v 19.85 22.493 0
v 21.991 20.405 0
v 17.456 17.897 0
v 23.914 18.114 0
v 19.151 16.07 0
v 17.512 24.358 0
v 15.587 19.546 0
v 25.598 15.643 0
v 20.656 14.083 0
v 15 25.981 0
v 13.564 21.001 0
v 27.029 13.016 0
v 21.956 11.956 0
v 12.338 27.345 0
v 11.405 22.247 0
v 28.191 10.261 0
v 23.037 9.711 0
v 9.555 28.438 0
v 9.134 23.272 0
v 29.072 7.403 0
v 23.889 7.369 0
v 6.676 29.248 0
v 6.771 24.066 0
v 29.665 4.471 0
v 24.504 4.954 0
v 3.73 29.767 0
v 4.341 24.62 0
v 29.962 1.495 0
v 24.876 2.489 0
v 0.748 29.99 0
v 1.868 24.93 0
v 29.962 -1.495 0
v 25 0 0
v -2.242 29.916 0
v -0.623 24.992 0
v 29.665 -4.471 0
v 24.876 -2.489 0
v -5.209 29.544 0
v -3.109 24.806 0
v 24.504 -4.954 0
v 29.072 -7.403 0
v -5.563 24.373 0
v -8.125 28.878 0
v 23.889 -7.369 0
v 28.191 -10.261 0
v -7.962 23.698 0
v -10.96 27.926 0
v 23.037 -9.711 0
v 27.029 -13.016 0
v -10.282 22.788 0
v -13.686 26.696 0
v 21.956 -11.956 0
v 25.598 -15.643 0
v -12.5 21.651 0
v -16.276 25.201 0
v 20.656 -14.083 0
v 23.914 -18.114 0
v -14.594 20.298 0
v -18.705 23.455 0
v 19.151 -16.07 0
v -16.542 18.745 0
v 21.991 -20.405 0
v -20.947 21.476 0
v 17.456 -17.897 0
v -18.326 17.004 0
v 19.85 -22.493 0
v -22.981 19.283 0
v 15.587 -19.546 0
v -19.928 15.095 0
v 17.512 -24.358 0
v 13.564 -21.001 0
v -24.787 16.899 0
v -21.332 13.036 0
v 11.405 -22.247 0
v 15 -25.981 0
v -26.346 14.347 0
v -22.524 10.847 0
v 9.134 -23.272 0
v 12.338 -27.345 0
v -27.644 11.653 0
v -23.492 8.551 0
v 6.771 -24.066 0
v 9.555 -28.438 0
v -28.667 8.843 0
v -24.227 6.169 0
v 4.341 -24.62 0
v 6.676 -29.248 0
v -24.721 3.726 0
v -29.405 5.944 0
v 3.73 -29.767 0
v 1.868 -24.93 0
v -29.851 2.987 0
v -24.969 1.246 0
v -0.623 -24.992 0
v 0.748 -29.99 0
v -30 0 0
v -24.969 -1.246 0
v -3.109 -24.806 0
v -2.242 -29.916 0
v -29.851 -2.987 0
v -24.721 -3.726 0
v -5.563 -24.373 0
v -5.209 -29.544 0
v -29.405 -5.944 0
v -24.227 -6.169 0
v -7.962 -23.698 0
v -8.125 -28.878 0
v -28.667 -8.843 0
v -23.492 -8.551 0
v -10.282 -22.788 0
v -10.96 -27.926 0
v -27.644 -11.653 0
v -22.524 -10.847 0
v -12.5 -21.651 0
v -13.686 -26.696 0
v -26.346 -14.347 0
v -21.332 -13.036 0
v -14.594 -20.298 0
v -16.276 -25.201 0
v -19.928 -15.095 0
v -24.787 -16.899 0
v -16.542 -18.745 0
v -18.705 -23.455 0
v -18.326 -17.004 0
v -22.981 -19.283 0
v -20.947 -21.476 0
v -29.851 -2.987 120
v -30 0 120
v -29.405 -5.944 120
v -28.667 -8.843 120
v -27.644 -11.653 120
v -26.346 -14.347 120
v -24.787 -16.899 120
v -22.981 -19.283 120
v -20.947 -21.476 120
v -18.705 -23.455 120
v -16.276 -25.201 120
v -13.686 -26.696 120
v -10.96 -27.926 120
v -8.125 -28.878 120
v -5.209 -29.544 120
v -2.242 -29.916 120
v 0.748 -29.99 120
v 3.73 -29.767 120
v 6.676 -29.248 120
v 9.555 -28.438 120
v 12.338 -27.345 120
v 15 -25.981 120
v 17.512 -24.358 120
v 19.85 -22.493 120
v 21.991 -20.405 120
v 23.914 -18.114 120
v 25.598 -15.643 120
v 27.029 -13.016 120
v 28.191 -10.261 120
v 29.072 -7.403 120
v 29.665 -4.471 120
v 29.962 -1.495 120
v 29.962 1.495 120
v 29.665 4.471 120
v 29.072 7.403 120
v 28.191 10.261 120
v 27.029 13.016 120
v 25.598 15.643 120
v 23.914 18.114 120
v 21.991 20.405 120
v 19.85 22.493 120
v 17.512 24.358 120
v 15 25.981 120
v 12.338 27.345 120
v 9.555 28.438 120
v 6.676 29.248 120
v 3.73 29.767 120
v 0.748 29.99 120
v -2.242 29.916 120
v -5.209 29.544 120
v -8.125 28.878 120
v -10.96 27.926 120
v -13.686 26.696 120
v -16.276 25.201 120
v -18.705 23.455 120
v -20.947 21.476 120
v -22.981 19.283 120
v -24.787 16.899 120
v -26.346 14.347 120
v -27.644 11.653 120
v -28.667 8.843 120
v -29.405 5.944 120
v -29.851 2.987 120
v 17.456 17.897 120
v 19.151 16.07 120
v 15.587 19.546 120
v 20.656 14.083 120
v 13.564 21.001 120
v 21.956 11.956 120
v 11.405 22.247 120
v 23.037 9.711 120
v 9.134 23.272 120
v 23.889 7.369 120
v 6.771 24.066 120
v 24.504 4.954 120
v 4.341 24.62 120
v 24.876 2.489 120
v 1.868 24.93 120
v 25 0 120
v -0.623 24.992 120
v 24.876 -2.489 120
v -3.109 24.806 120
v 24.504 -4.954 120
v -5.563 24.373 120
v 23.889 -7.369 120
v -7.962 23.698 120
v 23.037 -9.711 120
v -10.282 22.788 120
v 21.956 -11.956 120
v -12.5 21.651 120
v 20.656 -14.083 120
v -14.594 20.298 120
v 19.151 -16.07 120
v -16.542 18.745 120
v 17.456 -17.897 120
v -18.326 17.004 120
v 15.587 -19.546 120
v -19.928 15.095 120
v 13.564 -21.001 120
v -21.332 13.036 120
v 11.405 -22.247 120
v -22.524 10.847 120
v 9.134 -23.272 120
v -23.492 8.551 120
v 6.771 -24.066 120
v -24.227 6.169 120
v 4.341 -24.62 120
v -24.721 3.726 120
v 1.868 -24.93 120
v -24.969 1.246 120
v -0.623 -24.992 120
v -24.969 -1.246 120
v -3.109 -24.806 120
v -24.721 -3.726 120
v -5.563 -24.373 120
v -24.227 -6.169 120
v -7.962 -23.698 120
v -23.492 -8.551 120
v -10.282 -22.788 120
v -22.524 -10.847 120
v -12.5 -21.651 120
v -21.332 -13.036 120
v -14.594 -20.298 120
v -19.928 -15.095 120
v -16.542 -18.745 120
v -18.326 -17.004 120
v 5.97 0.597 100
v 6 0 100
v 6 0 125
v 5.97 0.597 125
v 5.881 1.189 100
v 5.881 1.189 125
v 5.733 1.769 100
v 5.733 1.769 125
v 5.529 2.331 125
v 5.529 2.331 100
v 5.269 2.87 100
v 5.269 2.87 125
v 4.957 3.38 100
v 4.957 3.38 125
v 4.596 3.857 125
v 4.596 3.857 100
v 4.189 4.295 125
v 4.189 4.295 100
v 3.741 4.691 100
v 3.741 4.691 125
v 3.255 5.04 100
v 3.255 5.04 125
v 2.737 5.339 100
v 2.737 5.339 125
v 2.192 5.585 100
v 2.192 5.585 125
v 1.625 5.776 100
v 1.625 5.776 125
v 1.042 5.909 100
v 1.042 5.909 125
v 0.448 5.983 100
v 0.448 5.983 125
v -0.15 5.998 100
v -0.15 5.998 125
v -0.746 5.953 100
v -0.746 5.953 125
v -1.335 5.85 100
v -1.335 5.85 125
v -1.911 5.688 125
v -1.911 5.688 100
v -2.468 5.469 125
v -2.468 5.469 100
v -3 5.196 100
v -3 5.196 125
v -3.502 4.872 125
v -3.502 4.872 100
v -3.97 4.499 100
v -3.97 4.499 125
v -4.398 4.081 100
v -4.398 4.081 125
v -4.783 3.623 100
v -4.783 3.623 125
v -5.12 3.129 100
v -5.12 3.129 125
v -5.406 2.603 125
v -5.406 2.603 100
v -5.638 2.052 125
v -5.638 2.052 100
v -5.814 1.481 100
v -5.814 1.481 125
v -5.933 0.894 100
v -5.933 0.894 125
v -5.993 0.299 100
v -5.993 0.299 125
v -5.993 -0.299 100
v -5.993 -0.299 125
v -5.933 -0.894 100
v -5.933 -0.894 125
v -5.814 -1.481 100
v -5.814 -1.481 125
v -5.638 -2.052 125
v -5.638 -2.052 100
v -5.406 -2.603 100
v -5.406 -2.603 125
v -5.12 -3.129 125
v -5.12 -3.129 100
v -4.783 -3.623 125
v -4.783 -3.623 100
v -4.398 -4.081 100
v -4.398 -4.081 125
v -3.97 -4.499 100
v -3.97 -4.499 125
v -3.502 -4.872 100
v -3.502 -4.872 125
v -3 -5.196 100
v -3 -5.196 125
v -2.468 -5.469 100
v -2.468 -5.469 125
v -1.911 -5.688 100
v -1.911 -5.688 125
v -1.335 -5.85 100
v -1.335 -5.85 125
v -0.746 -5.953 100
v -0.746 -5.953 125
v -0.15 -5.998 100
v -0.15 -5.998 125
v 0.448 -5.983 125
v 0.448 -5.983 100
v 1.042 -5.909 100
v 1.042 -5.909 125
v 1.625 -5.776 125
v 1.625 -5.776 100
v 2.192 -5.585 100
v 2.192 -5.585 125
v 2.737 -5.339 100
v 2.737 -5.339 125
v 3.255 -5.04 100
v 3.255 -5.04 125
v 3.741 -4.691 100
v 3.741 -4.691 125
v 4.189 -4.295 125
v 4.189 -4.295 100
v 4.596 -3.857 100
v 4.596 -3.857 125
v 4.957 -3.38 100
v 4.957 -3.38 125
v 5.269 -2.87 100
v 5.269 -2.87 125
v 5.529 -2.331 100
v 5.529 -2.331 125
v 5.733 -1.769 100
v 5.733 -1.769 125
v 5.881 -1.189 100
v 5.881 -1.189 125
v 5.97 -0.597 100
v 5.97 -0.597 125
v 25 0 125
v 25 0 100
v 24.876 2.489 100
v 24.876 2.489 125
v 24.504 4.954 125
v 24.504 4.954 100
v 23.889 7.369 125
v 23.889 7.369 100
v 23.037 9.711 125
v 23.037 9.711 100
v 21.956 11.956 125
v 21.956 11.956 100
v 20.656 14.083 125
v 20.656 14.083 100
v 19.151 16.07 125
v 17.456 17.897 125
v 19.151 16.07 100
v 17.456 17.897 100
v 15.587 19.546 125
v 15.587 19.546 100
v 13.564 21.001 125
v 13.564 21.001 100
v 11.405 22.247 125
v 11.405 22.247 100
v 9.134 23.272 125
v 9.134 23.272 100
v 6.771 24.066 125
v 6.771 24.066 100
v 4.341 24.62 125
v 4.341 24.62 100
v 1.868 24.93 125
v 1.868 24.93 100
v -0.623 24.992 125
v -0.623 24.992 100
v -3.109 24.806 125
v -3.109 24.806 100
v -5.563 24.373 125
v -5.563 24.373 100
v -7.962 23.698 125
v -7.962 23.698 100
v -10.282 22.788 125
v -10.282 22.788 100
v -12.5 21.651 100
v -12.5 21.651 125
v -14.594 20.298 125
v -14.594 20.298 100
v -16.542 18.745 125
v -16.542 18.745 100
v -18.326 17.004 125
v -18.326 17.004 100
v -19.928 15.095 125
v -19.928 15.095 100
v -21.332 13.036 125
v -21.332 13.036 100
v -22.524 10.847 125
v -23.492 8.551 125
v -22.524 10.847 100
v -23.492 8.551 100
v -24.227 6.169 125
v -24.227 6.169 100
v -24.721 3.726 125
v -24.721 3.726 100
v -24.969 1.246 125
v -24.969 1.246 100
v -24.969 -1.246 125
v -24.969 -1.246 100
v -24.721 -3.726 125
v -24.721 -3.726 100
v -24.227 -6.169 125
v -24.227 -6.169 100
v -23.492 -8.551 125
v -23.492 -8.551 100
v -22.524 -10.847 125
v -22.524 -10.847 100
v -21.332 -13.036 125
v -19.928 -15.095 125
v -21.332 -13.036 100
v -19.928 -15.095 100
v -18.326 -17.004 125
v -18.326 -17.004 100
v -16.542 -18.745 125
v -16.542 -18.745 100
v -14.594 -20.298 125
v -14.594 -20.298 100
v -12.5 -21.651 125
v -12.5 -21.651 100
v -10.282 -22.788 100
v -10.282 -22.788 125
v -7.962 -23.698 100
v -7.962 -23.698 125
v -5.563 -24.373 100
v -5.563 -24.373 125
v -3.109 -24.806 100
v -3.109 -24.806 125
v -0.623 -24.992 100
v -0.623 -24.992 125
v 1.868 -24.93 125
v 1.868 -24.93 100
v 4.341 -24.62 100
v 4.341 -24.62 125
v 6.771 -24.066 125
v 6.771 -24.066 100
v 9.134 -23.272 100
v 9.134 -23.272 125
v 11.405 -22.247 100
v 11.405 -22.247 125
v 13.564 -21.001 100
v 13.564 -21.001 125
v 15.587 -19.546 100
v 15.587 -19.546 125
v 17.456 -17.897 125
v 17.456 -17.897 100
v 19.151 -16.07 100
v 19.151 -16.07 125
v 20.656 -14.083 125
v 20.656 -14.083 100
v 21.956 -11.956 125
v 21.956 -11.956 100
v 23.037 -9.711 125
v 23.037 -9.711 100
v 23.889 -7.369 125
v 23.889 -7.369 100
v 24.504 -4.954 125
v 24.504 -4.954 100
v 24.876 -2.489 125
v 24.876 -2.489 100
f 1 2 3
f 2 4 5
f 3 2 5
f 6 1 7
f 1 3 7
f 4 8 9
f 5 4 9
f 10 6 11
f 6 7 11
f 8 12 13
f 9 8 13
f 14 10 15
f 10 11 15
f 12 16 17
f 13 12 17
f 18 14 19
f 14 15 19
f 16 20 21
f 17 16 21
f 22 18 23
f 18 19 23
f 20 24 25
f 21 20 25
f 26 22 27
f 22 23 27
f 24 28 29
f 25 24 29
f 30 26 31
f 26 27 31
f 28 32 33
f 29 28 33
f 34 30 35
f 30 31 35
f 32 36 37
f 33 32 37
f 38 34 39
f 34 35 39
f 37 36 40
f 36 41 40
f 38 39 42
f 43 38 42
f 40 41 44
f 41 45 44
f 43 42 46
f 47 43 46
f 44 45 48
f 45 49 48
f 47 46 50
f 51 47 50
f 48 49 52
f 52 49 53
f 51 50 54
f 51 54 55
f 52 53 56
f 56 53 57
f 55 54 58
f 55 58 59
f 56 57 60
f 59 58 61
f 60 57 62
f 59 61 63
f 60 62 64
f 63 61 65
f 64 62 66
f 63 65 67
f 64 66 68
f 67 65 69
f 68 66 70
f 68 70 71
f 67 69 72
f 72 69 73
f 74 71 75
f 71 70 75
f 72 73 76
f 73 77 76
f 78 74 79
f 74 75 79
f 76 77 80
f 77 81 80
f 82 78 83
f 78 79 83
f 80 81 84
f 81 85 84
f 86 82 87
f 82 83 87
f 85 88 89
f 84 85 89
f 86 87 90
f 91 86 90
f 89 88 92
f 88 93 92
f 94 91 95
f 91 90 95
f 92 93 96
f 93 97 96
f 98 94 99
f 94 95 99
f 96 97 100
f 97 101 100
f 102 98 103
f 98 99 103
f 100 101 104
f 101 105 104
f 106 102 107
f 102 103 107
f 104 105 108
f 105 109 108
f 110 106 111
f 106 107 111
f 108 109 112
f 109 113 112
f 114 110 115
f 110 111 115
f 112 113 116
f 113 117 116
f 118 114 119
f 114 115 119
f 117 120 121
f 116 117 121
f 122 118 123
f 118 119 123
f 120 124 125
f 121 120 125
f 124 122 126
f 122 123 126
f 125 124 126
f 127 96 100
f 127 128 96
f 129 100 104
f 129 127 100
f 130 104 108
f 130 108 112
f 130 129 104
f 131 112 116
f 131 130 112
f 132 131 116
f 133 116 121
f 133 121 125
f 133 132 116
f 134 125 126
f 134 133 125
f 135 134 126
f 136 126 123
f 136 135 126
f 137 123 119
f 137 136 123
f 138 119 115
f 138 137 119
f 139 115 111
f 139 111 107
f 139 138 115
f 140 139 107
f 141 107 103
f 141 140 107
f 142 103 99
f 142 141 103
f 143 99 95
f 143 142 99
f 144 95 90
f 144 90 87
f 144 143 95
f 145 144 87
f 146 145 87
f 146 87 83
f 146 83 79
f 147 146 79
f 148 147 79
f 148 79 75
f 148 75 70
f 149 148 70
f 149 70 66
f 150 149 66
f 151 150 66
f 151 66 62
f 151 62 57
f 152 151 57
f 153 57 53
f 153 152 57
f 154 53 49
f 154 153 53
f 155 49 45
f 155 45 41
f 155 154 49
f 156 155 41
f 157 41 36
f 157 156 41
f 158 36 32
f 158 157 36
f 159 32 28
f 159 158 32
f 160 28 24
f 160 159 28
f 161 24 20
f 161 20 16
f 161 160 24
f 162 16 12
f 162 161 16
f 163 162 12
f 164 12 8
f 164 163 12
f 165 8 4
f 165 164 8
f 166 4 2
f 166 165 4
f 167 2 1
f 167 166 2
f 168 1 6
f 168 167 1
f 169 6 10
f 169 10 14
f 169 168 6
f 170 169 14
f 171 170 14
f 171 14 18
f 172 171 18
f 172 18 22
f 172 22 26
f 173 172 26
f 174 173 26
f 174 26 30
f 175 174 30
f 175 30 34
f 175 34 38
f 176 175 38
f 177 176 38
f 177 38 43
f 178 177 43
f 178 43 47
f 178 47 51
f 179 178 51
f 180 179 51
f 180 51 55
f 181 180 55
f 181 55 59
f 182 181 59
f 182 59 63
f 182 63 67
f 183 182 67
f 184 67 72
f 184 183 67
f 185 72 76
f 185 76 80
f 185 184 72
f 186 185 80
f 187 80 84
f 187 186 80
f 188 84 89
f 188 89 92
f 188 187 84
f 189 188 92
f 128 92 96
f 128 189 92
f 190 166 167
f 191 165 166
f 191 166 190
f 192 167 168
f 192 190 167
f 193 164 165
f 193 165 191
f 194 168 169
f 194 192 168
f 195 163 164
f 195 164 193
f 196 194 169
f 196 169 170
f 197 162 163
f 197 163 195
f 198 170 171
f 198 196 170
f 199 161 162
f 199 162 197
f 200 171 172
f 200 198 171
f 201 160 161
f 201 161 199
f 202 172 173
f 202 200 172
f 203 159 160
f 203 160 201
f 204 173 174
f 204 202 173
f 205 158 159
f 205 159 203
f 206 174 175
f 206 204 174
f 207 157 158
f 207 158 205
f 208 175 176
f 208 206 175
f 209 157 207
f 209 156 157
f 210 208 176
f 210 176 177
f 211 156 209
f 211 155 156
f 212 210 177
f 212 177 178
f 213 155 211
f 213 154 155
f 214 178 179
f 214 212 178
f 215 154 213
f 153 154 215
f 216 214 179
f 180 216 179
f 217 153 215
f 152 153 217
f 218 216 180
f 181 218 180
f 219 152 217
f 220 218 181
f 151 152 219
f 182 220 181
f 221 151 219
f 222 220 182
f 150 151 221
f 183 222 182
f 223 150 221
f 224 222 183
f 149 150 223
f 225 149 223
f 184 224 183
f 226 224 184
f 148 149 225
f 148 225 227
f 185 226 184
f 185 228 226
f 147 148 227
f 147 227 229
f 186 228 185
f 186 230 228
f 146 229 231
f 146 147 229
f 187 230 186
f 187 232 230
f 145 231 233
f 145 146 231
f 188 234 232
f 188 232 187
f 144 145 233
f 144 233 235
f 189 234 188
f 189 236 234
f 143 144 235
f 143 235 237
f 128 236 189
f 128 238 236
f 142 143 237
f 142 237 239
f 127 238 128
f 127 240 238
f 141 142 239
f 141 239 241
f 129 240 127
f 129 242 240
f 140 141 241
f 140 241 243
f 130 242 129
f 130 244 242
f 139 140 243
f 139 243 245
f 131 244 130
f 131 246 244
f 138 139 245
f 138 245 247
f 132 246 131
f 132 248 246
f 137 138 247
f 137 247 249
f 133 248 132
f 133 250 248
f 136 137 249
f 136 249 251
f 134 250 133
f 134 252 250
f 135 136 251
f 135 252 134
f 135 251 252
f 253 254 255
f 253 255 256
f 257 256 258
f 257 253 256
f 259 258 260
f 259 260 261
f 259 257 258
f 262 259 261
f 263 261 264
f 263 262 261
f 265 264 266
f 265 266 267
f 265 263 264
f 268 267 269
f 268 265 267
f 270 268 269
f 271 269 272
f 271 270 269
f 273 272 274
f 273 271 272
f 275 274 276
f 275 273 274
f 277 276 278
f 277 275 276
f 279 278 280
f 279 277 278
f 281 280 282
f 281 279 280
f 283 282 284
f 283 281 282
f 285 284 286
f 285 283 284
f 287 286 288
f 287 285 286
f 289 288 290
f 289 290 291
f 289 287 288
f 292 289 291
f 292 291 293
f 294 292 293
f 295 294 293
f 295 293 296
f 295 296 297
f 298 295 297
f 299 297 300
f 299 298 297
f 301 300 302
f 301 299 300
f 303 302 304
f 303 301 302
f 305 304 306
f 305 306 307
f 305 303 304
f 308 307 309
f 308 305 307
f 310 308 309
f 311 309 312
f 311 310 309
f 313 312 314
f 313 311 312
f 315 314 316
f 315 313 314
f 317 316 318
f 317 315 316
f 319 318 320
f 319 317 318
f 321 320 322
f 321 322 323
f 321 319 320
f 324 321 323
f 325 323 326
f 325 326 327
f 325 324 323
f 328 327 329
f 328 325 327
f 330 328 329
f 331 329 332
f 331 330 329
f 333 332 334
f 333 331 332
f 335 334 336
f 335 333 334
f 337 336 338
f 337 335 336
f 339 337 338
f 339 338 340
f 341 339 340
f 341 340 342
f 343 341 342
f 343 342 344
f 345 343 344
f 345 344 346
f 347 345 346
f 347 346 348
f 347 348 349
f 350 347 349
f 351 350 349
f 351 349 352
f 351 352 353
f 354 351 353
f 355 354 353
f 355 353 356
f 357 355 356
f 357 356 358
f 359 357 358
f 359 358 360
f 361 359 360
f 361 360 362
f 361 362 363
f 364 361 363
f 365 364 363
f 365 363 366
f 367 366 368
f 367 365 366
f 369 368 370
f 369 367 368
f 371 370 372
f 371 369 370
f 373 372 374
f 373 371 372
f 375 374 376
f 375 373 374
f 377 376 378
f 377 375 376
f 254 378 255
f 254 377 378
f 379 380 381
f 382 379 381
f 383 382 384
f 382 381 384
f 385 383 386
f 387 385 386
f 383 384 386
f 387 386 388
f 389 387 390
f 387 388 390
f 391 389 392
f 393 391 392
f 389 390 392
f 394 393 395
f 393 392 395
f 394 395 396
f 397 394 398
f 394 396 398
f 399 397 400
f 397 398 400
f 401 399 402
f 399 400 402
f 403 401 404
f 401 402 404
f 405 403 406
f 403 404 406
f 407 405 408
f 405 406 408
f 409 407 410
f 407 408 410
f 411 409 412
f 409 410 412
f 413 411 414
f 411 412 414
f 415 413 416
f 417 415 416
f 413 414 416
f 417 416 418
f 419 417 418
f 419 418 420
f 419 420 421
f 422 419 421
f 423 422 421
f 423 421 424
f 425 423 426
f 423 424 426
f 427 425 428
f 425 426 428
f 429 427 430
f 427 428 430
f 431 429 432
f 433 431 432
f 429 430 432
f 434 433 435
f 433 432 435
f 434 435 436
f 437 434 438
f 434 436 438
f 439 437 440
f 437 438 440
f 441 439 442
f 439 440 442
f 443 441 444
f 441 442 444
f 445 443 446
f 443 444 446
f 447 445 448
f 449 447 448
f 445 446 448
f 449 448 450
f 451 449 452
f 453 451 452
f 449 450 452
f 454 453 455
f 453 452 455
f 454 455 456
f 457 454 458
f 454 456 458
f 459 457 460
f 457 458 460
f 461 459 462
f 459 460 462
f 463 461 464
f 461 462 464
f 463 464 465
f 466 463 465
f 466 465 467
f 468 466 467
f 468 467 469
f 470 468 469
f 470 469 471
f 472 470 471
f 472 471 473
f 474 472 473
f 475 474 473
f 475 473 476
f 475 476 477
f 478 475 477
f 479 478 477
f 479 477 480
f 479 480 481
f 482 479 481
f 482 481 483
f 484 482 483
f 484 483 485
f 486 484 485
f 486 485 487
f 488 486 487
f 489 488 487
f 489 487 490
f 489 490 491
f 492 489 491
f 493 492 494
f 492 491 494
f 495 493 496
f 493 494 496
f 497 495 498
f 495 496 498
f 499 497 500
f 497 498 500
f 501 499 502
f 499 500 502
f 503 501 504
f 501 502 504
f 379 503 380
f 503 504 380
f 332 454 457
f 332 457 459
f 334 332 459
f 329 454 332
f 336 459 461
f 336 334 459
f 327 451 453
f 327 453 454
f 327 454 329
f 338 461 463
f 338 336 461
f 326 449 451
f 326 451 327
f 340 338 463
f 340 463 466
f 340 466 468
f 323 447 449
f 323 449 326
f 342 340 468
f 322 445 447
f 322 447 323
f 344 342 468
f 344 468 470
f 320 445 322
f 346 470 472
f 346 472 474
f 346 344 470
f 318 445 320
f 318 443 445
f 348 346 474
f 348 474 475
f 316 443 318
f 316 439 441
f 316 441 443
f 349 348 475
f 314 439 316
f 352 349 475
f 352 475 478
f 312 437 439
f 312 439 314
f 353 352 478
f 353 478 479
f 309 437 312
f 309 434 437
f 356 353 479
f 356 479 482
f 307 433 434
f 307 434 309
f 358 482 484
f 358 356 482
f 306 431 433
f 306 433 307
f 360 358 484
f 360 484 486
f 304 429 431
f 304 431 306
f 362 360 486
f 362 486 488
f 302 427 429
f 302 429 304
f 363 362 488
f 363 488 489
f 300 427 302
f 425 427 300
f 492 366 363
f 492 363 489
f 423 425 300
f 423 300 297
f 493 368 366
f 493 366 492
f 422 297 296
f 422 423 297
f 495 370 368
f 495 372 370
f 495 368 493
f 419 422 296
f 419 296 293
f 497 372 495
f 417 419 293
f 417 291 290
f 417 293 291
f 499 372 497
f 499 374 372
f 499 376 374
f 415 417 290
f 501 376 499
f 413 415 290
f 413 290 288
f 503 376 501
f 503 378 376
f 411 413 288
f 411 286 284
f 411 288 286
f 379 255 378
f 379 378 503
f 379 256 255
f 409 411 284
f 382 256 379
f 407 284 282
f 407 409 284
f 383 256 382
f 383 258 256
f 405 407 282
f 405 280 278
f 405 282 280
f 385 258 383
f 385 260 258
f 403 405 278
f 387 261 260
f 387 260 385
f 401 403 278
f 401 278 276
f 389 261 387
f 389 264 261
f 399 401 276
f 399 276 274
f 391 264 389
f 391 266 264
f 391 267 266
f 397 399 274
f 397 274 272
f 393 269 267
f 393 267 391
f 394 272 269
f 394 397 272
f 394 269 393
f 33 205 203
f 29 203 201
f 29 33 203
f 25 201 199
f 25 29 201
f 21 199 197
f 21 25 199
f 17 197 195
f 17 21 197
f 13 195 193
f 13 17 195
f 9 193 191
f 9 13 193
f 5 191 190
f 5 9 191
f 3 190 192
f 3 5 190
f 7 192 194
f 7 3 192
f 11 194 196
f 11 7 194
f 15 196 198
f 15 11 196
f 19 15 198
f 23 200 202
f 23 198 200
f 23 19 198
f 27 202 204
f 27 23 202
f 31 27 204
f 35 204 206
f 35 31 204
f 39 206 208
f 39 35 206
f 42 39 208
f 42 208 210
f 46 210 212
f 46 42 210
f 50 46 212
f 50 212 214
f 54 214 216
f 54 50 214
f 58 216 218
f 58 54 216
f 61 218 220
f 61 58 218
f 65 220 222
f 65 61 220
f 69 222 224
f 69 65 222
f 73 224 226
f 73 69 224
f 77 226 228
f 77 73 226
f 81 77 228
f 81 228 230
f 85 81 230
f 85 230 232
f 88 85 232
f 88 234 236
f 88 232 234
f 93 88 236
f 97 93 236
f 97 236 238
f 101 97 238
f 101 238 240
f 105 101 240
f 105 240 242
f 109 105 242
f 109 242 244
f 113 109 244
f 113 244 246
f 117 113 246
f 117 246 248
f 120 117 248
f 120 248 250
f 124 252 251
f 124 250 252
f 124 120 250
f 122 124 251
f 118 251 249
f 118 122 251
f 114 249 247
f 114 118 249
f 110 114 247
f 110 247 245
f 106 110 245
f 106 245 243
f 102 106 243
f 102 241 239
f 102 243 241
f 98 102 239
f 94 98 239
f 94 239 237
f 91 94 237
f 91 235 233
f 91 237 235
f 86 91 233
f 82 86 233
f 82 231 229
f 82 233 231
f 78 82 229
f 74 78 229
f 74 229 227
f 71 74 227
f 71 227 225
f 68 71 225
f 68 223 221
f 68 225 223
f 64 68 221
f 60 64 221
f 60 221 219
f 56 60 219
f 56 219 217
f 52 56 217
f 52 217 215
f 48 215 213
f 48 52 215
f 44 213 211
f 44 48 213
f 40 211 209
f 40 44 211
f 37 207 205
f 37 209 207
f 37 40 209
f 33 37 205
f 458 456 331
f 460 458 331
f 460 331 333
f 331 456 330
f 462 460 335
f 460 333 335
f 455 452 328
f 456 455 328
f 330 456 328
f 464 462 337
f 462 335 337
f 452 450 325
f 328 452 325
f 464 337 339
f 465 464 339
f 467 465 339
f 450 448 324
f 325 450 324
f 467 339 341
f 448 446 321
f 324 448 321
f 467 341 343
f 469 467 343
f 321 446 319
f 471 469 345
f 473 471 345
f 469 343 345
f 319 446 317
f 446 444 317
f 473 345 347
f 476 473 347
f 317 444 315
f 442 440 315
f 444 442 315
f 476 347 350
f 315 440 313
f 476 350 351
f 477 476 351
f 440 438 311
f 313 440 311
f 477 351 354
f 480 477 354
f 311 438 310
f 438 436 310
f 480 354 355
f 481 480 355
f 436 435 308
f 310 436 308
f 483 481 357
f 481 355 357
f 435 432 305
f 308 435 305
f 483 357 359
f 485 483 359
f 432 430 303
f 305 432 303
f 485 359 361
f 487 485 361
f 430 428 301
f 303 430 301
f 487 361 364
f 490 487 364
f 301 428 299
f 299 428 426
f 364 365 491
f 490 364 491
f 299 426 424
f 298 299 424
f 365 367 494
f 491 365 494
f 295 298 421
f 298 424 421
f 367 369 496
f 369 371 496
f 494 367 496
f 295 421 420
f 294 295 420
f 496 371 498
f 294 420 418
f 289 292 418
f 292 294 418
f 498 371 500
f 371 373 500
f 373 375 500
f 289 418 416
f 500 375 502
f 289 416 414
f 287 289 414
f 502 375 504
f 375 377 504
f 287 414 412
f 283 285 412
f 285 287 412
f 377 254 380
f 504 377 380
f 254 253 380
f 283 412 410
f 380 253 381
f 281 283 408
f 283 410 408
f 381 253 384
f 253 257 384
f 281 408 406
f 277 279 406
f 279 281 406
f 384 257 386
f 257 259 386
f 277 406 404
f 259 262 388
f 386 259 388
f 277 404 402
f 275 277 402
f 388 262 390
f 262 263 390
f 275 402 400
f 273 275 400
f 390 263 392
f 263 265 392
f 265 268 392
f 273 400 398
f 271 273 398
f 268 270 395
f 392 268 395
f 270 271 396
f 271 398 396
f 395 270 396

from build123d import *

# Parameters (mm, degrees)
F0_W     = 29.9997191348
F0_H     = 120
F2_R     = 25
F3_DEPTH = 120.001
F4_R     = 5
F5_DEPTH = 120.001
F7_R     = 25
F7_R_2   = 6
F8_DEPTH = 25


with BuildPart() as f1:
    # F0 (on Front) → F1 (revolve)
    with BuildSketch(Plane.XZ):
        with Locations((-14.9998595674, 60)):
            Rectangle(F0_W, F0_H)
    revolve(axis=Axis((0, 0, 60), (0, 0, 1)))

    # F2 (on Top) → F3 (cut, through all)
    with BuildSketch(Plane.XY):
        Circle(F2_R)
    extrude(amount=F3_DEPTH, mode=Mode.SUBTRACT)

    # F4 (on Top) → F5 (cut, through all)
    with BuildSketch(Plane.XY):
        Circle(F4_R)
    extrude(amount=F5_DEPTH, mode=Mode.SUBTRACT)


with BuildPart() as f8:
    # F7 (on offset) → F8 (new body)
    with BuildSketch(Plane.XY.offset(100)):
        Circle(F7_R)
        Circle(F7_R_2, mode=Mode.SUBTRACT)
    extrude(amount=F8_DEPTH)


solid = Compound([f1.part, f8.part])
